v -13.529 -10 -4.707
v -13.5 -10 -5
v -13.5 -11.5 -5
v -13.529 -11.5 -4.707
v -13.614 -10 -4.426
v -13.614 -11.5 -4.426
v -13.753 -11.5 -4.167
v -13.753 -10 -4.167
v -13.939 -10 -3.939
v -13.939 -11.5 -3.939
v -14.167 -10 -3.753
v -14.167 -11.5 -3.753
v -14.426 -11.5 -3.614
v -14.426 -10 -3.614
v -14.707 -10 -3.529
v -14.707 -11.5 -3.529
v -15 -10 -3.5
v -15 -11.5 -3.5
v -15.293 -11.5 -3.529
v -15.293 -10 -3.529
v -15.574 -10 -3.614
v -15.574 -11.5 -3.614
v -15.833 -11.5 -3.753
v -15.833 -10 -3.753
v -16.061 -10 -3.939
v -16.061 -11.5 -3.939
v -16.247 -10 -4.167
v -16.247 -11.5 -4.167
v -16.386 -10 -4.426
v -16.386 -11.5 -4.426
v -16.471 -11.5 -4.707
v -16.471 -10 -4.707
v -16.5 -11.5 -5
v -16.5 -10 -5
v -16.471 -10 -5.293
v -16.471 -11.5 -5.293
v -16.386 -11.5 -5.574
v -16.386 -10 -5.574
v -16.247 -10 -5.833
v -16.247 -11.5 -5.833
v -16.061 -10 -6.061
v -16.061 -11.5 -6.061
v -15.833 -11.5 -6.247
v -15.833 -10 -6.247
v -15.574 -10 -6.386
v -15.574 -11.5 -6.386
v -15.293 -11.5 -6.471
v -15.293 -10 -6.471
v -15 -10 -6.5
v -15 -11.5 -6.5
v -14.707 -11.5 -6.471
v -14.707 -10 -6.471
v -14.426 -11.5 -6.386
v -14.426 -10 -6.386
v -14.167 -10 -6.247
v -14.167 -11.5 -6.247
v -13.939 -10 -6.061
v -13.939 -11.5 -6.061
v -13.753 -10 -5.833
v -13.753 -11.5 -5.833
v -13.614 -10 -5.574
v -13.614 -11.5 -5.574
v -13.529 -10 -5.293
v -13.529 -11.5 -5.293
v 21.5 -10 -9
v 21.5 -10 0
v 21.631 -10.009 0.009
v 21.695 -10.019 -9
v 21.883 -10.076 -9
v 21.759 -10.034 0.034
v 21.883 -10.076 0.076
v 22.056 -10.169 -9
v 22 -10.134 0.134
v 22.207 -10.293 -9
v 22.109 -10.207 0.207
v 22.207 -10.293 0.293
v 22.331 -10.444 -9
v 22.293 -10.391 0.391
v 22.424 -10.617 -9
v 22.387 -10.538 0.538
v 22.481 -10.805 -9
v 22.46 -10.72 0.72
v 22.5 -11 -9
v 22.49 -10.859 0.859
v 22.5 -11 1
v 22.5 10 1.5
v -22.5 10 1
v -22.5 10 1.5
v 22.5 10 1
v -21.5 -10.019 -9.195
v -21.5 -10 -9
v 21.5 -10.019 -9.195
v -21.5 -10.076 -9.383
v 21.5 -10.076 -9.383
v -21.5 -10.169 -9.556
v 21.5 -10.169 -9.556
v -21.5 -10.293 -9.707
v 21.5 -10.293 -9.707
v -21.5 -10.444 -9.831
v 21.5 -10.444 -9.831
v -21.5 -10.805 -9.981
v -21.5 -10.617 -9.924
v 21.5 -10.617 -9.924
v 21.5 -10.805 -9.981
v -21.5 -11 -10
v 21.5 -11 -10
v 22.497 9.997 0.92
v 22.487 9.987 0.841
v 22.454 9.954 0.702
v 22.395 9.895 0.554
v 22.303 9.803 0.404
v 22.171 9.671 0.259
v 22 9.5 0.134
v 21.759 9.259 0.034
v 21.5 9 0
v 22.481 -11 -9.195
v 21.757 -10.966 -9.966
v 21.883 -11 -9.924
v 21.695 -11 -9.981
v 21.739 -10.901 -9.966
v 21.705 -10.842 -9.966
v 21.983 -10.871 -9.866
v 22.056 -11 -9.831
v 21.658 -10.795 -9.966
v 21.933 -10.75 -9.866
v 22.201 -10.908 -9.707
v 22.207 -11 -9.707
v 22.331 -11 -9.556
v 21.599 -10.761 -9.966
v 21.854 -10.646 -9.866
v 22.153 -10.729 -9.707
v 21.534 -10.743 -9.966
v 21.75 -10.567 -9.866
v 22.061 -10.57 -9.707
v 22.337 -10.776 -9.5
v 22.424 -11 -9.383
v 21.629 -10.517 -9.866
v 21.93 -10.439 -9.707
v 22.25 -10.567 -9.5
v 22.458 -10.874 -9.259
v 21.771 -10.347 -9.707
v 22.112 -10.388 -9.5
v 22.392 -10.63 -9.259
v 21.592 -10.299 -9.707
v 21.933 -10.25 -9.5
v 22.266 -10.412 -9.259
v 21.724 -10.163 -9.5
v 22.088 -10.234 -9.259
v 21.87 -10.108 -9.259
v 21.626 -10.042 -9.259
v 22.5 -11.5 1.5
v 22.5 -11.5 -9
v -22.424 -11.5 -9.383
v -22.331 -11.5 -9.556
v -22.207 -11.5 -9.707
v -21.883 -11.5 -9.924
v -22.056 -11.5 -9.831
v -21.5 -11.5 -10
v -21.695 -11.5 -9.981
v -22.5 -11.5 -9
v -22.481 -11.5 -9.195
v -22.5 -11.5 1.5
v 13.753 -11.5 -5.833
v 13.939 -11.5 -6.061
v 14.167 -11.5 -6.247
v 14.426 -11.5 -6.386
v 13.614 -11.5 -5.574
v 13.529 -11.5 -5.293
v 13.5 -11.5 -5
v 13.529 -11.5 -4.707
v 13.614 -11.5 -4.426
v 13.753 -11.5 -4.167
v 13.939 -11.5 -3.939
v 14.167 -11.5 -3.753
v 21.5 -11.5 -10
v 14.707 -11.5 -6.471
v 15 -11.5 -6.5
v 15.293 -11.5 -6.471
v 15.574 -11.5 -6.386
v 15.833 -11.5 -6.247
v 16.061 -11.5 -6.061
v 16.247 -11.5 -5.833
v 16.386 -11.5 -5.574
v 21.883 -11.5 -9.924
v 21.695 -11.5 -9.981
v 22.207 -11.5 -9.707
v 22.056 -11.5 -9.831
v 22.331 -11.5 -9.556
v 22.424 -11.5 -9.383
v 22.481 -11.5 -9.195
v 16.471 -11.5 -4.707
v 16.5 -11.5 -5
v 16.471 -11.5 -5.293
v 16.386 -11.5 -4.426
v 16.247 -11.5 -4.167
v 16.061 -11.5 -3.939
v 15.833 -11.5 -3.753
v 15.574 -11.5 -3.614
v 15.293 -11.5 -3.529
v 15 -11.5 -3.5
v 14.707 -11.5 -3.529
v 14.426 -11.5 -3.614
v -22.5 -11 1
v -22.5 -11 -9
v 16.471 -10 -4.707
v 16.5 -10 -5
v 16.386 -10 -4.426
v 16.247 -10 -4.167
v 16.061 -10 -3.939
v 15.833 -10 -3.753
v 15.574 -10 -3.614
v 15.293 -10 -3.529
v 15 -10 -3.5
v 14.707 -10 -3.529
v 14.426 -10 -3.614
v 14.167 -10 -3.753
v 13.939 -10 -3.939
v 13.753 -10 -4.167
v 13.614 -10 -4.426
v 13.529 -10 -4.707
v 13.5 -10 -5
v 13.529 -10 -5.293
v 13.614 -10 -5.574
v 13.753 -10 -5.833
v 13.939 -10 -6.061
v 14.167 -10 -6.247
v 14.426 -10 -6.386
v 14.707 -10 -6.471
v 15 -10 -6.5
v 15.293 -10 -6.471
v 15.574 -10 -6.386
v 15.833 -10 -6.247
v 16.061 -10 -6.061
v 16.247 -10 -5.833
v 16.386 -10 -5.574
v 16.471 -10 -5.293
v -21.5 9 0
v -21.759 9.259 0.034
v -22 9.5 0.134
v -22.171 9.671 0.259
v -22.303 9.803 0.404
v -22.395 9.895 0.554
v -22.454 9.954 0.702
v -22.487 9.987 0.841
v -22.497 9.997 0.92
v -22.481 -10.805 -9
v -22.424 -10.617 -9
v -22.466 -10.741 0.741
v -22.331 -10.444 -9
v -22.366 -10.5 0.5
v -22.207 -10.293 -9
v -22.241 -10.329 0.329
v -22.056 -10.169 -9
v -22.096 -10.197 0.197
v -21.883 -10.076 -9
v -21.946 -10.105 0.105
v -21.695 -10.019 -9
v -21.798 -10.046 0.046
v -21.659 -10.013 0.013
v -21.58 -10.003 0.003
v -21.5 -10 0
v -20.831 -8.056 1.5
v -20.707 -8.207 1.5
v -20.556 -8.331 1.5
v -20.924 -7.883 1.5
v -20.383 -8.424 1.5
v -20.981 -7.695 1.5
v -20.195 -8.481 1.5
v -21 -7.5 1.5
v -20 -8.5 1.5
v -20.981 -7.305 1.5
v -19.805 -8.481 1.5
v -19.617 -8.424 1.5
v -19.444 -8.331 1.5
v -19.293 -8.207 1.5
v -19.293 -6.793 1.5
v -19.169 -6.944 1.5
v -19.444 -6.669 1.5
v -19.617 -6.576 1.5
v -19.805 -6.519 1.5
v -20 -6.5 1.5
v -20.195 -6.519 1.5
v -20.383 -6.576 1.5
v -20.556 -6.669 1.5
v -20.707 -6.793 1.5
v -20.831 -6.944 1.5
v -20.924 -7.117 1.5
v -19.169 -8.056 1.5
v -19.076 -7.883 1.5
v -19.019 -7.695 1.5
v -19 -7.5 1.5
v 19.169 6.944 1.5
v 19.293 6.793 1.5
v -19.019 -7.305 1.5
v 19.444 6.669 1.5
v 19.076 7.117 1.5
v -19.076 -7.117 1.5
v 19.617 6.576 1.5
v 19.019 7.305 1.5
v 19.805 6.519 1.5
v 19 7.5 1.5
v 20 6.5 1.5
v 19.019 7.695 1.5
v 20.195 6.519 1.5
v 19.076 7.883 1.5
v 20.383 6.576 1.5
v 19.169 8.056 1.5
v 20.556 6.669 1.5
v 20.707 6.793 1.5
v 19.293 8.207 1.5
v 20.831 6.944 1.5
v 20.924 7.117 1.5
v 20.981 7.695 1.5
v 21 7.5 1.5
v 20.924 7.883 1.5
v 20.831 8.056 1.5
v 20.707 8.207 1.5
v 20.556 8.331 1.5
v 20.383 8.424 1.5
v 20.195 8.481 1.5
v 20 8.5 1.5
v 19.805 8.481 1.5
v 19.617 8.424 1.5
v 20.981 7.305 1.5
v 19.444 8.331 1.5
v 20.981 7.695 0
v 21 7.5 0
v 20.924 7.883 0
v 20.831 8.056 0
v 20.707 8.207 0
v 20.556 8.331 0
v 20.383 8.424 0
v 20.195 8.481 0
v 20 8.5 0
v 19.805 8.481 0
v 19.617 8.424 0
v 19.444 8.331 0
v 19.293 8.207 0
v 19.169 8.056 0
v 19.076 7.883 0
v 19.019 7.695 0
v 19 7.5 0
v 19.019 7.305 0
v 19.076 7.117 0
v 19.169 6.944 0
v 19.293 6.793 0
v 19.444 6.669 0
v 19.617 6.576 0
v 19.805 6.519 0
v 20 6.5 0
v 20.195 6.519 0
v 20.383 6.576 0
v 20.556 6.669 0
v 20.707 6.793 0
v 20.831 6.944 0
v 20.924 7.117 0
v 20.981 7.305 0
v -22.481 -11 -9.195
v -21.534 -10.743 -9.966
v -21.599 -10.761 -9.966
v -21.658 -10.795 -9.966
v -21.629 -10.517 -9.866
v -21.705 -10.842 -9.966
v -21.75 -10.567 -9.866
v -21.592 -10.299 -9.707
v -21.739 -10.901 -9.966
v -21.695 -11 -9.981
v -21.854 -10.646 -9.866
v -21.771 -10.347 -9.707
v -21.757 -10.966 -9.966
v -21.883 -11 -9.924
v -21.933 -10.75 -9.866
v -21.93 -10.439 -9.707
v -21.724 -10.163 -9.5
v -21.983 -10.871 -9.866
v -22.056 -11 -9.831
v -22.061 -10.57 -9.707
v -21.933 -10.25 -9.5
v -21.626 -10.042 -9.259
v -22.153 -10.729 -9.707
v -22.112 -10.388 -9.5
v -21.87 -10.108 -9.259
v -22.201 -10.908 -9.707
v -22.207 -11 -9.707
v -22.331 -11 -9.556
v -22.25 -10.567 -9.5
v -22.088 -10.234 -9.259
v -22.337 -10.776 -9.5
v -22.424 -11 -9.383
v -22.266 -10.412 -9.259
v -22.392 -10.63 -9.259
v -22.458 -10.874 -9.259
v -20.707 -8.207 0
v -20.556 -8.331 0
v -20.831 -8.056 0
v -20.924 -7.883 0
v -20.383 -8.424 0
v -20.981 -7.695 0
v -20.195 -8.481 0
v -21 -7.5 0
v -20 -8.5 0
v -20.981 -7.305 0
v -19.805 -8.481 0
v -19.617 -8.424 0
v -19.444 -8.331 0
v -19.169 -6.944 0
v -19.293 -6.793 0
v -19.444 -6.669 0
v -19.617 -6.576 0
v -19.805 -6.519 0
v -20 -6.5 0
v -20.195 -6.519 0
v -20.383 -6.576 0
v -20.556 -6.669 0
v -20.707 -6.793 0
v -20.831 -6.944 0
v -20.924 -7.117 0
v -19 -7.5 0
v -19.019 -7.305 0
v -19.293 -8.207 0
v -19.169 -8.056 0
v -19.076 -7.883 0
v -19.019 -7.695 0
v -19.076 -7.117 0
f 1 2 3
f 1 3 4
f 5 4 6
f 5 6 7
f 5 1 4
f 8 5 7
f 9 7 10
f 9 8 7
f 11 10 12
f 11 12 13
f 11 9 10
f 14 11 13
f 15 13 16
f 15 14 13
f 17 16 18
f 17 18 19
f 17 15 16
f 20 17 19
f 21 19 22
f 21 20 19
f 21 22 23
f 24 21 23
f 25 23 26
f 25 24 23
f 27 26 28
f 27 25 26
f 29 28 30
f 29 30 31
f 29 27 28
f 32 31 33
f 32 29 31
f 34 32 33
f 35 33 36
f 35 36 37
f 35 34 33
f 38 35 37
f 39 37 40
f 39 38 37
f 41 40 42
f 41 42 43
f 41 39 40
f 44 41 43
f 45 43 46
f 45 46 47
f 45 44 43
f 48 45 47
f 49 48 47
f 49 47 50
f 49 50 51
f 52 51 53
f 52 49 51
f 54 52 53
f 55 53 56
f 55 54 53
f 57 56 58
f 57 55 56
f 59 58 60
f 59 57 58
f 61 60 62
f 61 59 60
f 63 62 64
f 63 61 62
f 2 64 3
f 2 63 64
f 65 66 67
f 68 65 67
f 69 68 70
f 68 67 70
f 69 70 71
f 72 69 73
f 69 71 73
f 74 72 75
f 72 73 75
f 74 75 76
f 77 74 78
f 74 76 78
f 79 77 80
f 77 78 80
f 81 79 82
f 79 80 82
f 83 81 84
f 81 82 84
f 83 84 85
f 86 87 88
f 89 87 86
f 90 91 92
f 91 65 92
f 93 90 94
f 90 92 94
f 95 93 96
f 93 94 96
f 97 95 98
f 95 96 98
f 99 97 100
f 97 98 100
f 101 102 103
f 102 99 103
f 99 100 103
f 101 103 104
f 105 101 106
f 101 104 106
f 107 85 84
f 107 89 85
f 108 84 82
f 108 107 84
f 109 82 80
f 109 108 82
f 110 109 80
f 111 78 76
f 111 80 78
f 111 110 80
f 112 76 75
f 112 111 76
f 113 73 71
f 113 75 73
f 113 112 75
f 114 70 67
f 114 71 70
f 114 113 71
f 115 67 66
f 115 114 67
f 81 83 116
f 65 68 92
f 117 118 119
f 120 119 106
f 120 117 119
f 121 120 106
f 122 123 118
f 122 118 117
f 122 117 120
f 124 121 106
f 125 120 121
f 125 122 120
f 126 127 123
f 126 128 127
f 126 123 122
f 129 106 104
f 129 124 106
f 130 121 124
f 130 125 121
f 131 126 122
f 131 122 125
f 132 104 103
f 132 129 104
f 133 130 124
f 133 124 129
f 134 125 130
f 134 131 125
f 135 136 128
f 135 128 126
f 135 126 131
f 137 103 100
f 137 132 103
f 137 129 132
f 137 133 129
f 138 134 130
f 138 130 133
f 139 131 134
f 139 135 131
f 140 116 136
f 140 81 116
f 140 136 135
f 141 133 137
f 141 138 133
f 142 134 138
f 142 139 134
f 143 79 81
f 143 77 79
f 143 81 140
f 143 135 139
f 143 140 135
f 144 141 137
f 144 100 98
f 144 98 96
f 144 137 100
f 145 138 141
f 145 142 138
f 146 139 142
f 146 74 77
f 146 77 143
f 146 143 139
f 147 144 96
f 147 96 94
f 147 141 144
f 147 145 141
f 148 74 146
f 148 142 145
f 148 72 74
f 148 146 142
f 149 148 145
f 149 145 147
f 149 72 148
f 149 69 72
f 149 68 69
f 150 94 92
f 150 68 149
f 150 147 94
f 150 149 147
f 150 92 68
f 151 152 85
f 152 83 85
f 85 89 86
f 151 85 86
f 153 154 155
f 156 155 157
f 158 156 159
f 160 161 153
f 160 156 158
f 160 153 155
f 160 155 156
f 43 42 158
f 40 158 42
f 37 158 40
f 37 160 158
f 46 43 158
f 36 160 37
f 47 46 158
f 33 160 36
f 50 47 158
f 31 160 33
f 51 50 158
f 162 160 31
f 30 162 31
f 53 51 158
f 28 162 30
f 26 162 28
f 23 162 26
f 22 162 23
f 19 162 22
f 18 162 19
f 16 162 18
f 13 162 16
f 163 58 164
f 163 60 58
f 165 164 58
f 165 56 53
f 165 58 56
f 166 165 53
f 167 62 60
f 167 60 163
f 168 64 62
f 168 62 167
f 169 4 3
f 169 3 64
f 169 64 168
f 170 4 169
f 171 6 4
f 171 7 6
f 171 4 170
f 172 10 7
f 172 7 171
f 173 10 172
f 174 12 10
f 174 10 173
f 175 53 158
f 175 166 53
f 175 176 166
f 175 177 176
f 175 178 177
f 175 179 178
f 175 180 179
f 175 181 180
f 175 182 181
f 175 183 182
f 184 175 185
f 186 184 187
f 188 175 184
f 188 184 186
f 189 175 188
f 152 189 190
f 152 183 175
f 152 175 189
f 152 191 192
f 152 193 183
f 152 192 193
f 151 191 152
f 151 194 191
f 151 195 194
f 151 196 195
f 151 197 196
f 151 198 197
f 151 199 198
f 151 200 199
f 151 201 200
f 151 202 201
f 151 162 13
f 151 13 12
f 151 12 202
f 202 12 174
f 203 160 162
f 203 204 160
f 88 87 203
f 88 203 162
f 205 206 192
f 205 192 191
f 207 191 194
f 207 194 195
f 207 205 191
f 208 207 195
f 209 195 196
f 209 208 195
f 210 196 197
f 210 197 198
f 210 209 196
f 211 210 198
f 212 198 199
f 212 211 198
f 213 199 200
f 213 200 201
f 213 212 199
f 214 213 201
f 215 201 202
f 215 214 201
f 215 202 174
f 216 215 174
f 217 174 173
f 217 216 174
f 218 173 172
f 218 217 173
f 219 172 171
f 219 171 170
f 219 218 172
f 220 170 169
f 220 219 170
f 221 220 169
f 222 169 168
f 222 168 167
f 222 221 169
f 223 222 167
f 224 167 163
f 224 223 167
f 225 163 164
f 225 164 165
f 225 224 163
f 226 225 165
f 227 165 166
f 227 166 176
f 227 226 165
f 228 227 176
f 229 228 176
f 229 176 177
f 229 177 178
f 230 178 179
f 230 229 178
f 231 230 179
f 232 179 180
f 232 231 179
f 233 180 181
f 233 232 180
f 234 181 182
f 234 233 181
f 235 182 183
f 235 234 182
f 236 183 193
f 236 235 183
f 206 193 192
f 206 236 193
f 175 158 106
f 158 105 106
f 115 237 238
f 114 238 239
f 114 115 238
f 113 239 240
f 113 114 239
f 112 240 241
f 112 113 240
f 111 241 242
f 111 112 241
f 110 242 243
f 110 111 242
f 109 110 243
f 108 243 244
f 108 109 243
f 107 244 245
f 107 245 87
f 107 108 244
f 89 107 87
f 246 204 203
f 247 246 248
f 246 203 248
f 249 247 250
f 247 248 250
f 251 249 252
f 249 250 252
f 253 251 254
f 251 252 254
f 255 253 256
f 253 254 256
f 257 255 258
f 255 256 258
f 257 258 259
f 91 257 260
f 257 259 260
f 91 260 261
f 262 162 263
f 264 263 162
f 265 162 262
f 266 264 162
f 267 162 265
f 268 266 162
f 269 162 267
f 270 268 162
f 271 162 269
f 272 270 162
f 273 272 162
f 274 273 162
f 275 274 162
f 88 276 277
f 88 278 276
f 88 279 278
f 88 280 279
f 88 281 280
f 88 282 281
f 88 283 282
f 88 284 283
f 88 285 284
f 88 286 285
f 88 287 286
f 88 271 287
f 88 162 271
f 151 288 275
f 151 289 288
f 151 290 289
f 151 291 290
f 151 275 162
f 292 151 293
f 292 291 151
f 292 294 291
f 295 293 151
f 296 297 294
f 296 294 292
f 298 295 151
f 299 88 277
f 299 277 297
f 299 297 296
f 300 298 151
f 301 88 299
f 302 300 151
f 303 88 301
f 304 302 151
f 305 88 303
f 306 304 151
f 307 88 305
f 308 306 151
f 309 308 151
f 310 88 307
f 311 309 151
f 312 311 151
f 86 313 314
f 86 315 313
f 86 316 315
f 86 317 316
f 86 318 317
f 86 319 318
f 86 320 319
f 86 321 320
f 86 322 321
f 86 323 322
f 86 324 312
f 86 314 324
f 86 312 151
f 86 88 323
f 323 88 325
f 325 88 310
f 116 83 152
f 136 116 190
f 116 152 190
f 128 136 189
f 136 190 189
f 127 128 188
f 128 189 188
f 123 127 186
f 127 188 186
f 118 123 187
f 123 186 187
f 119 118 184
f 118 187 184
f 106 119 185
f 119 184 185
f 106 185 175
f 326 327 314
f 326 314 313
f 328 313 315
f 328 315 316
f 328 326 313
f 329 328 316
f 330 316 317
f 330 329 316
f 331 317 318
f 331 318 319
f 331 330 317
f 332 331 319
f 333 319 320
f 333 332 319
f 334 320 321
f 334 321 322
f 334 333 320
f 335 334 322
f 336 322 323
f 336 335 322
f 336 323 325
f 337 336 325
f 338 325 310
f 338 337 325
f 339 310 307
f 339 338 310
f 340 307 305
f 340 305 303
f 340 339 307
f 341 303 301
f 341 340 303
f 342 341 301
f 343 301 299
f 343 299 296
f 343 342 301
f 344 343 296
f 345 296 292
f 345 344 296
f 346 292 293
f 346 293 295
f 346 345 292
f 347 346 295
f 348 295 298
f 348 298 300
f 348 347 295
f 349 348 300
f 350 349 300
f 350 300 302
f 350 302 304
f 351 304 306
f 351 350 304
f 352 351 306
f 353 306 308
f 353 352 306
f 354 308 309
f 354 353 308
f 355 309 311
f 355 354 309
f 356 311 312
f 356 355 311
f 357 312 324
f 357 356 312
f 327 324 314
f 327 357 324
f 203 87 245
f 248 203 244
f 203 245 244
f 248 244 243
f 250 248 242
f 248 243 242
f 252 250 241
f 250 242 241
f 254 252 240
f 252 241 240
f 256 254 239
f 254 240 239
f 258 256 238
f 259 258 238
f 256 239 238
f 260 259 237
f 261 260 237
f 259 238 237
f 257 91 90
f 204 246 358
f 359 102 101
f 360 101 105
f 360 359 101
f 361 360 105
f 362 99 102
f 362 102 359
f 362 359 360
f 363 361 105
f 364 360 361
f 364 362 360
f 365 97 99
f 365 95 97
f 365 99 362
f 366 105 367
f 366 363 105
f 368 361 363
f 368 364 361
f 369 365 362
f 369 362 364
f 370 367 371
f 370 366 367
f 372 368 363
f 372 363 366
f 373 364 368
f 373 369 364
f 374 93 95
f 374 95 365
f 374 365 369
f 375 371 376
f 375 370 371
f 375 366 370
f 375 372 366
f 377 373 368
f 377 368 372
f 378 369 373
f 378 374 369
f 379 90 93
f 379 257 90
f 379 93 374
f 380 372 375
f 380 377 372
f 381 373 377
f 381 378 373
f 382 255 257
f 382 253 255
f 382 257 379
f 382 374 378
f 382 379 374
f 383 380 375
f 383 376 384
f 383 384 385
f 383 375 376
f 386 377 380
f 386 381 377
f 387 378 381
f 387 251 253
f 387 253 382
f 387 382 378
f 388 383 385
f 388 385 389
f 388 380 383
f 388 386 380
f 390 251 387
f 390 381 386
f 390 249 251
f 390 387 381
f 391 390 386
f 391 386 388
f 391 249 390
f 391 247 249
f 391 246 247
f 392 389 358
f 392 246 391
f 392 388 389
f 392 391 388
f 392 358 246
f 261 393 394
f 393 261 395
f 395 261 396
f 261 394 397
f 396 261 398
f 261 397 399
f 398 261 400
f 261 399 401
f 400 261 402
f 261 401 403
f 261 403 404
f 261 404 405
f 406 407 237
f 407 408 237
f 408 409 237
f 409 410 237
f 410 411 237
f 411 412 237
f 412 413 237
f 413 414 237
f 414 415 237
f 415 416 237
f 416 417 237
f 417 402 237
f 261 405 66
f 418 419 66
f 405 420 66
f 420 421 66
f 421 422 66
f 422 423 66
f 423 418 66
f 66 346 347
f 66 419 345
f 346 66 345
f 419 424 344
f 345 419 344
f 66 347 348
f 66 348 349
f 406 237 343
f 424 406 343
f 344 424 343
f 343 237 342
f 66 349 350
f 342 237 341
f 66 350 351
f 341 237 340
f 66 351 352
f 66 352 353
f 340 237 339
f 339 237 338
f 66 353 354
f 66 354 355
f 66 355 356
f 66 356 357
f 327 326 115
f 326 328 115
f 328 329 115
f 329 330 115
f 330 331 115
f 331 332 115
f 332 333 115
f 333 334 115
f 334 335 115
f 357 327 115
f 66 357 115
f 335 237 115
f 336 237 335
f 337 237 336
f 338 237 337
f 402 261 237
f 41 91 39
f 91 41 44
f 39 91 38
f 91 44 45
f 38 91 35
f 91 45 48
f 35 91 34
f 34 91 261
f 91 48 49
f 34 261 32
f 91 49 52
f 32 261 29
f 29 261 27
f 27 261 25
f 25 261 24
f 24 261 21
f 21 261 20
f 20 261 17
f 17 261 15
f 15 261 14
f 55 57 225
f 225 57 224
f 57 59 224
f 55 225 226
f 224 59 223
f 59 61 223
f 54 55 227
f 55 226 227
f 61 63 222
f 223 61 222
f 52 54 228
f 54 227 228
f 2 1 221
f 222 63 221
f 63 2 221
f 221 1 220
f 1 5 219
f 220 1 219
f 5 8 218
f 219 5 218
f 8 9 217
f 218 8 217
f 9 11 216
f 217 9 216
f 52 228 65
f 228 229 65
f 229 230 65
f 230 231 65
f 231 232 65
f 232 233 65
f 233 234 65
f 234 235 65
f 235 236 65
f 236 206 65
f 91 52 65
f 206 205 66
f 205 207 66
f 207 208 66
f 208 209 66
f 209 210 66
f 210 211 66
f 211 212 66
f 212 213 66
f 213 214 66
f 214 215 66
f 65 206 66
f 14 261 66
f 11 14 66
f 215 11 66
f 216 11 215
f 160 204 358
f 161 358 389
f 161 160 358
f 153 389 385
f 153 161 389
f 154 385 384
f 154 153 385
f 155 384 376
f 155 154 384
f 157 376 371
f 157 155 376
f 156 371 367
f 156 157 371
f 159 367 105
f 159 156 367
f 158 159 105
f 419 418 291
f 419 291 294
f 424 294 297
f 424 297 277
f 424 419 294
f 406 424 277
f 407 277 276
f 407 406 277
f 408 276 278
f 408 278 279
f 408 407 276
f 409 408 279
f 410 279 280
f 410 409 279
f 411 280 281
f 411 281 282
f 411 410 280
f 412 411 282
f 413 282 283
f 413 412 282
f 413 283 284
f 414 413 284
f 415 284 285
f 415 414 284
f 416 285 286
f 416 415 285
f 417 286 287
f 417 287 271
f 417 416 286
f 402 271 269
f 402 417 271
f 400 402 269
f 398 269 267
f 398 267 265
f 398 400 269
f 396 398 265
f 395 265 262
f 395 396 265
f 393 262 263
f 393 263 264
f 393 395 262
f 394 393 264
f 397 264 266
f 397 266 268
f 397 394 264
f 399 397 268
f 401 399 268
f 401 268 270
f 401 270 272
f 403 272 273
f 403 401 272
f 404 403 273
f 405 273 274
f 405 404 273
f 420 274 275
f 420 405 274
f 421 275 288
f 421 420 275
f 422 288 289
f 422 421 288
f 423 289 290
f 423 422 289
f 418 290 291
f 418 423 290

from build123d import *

# Parameters (mm, degrees)
SKETCH1_W           = 45
SKETCH1_H           = 20
SKETCH1_R           = 1
BOSS_EXTRUDE1_DEPTH = 1.5
SKETCH2_W           = 45
SKETCH2_H           = 11.5
SKETCH2_R           = 1.5
BOSS_EXTRUDE2_DEPTH = 1.5
FILLET1_R           = 1


with BuildPart() as part:
    # Sketch1 → Boss-Extrude1 (new body)
    with BuildSketch(Plane.XY):
        Rectangle(SKETCH1_W, SKETCH1_H)
        with Locations((20, 7.5)):
            Circle(SKETCH1_R, mode=Mode.SUBTRACT)
        with Locations((-20, -7.5)):
            Circle(SKETCH1_R, mode=Mode.SUBTRACT)
    extrude(amount=BOSS_EXTRUDE1_DEPTH)

    # Sketch2 → Boss-Extrude2 (add)
    with BuildSketch(Plane.XZ.offset(10)):
        with Locations((0, -4.25)):
            Rectangle(SKETCH2_W, SKETCH2_H)
        with Locations((-15, -5)):
            Circle(SKETCH2_R, mode=Mode.SUBTRACT)
        with Locations((15, -5)):
            Circle(SKETCH2_R, mode=Mode.SUBTRACT)
    extrude(amount=BOSS_EXTRUDE2_DEPTH)

    # Fillet1
    fillet1_edges = [part.edges().sort_by_distance(p)[0] for p in [
        (22.5, -10, -5),
        (22.5, -10.75, -10),
        (-22.5, -10, -5),
        (0, -10, -10),
        (-22.5, -10.75, -10),
        (0, 10, 0),
        (22.5, 0, 0),
        (-22.5, 0, 0),
    ]]
    fillet(fillet1_edges, radius=FILLET1_R)


solid = part.part
